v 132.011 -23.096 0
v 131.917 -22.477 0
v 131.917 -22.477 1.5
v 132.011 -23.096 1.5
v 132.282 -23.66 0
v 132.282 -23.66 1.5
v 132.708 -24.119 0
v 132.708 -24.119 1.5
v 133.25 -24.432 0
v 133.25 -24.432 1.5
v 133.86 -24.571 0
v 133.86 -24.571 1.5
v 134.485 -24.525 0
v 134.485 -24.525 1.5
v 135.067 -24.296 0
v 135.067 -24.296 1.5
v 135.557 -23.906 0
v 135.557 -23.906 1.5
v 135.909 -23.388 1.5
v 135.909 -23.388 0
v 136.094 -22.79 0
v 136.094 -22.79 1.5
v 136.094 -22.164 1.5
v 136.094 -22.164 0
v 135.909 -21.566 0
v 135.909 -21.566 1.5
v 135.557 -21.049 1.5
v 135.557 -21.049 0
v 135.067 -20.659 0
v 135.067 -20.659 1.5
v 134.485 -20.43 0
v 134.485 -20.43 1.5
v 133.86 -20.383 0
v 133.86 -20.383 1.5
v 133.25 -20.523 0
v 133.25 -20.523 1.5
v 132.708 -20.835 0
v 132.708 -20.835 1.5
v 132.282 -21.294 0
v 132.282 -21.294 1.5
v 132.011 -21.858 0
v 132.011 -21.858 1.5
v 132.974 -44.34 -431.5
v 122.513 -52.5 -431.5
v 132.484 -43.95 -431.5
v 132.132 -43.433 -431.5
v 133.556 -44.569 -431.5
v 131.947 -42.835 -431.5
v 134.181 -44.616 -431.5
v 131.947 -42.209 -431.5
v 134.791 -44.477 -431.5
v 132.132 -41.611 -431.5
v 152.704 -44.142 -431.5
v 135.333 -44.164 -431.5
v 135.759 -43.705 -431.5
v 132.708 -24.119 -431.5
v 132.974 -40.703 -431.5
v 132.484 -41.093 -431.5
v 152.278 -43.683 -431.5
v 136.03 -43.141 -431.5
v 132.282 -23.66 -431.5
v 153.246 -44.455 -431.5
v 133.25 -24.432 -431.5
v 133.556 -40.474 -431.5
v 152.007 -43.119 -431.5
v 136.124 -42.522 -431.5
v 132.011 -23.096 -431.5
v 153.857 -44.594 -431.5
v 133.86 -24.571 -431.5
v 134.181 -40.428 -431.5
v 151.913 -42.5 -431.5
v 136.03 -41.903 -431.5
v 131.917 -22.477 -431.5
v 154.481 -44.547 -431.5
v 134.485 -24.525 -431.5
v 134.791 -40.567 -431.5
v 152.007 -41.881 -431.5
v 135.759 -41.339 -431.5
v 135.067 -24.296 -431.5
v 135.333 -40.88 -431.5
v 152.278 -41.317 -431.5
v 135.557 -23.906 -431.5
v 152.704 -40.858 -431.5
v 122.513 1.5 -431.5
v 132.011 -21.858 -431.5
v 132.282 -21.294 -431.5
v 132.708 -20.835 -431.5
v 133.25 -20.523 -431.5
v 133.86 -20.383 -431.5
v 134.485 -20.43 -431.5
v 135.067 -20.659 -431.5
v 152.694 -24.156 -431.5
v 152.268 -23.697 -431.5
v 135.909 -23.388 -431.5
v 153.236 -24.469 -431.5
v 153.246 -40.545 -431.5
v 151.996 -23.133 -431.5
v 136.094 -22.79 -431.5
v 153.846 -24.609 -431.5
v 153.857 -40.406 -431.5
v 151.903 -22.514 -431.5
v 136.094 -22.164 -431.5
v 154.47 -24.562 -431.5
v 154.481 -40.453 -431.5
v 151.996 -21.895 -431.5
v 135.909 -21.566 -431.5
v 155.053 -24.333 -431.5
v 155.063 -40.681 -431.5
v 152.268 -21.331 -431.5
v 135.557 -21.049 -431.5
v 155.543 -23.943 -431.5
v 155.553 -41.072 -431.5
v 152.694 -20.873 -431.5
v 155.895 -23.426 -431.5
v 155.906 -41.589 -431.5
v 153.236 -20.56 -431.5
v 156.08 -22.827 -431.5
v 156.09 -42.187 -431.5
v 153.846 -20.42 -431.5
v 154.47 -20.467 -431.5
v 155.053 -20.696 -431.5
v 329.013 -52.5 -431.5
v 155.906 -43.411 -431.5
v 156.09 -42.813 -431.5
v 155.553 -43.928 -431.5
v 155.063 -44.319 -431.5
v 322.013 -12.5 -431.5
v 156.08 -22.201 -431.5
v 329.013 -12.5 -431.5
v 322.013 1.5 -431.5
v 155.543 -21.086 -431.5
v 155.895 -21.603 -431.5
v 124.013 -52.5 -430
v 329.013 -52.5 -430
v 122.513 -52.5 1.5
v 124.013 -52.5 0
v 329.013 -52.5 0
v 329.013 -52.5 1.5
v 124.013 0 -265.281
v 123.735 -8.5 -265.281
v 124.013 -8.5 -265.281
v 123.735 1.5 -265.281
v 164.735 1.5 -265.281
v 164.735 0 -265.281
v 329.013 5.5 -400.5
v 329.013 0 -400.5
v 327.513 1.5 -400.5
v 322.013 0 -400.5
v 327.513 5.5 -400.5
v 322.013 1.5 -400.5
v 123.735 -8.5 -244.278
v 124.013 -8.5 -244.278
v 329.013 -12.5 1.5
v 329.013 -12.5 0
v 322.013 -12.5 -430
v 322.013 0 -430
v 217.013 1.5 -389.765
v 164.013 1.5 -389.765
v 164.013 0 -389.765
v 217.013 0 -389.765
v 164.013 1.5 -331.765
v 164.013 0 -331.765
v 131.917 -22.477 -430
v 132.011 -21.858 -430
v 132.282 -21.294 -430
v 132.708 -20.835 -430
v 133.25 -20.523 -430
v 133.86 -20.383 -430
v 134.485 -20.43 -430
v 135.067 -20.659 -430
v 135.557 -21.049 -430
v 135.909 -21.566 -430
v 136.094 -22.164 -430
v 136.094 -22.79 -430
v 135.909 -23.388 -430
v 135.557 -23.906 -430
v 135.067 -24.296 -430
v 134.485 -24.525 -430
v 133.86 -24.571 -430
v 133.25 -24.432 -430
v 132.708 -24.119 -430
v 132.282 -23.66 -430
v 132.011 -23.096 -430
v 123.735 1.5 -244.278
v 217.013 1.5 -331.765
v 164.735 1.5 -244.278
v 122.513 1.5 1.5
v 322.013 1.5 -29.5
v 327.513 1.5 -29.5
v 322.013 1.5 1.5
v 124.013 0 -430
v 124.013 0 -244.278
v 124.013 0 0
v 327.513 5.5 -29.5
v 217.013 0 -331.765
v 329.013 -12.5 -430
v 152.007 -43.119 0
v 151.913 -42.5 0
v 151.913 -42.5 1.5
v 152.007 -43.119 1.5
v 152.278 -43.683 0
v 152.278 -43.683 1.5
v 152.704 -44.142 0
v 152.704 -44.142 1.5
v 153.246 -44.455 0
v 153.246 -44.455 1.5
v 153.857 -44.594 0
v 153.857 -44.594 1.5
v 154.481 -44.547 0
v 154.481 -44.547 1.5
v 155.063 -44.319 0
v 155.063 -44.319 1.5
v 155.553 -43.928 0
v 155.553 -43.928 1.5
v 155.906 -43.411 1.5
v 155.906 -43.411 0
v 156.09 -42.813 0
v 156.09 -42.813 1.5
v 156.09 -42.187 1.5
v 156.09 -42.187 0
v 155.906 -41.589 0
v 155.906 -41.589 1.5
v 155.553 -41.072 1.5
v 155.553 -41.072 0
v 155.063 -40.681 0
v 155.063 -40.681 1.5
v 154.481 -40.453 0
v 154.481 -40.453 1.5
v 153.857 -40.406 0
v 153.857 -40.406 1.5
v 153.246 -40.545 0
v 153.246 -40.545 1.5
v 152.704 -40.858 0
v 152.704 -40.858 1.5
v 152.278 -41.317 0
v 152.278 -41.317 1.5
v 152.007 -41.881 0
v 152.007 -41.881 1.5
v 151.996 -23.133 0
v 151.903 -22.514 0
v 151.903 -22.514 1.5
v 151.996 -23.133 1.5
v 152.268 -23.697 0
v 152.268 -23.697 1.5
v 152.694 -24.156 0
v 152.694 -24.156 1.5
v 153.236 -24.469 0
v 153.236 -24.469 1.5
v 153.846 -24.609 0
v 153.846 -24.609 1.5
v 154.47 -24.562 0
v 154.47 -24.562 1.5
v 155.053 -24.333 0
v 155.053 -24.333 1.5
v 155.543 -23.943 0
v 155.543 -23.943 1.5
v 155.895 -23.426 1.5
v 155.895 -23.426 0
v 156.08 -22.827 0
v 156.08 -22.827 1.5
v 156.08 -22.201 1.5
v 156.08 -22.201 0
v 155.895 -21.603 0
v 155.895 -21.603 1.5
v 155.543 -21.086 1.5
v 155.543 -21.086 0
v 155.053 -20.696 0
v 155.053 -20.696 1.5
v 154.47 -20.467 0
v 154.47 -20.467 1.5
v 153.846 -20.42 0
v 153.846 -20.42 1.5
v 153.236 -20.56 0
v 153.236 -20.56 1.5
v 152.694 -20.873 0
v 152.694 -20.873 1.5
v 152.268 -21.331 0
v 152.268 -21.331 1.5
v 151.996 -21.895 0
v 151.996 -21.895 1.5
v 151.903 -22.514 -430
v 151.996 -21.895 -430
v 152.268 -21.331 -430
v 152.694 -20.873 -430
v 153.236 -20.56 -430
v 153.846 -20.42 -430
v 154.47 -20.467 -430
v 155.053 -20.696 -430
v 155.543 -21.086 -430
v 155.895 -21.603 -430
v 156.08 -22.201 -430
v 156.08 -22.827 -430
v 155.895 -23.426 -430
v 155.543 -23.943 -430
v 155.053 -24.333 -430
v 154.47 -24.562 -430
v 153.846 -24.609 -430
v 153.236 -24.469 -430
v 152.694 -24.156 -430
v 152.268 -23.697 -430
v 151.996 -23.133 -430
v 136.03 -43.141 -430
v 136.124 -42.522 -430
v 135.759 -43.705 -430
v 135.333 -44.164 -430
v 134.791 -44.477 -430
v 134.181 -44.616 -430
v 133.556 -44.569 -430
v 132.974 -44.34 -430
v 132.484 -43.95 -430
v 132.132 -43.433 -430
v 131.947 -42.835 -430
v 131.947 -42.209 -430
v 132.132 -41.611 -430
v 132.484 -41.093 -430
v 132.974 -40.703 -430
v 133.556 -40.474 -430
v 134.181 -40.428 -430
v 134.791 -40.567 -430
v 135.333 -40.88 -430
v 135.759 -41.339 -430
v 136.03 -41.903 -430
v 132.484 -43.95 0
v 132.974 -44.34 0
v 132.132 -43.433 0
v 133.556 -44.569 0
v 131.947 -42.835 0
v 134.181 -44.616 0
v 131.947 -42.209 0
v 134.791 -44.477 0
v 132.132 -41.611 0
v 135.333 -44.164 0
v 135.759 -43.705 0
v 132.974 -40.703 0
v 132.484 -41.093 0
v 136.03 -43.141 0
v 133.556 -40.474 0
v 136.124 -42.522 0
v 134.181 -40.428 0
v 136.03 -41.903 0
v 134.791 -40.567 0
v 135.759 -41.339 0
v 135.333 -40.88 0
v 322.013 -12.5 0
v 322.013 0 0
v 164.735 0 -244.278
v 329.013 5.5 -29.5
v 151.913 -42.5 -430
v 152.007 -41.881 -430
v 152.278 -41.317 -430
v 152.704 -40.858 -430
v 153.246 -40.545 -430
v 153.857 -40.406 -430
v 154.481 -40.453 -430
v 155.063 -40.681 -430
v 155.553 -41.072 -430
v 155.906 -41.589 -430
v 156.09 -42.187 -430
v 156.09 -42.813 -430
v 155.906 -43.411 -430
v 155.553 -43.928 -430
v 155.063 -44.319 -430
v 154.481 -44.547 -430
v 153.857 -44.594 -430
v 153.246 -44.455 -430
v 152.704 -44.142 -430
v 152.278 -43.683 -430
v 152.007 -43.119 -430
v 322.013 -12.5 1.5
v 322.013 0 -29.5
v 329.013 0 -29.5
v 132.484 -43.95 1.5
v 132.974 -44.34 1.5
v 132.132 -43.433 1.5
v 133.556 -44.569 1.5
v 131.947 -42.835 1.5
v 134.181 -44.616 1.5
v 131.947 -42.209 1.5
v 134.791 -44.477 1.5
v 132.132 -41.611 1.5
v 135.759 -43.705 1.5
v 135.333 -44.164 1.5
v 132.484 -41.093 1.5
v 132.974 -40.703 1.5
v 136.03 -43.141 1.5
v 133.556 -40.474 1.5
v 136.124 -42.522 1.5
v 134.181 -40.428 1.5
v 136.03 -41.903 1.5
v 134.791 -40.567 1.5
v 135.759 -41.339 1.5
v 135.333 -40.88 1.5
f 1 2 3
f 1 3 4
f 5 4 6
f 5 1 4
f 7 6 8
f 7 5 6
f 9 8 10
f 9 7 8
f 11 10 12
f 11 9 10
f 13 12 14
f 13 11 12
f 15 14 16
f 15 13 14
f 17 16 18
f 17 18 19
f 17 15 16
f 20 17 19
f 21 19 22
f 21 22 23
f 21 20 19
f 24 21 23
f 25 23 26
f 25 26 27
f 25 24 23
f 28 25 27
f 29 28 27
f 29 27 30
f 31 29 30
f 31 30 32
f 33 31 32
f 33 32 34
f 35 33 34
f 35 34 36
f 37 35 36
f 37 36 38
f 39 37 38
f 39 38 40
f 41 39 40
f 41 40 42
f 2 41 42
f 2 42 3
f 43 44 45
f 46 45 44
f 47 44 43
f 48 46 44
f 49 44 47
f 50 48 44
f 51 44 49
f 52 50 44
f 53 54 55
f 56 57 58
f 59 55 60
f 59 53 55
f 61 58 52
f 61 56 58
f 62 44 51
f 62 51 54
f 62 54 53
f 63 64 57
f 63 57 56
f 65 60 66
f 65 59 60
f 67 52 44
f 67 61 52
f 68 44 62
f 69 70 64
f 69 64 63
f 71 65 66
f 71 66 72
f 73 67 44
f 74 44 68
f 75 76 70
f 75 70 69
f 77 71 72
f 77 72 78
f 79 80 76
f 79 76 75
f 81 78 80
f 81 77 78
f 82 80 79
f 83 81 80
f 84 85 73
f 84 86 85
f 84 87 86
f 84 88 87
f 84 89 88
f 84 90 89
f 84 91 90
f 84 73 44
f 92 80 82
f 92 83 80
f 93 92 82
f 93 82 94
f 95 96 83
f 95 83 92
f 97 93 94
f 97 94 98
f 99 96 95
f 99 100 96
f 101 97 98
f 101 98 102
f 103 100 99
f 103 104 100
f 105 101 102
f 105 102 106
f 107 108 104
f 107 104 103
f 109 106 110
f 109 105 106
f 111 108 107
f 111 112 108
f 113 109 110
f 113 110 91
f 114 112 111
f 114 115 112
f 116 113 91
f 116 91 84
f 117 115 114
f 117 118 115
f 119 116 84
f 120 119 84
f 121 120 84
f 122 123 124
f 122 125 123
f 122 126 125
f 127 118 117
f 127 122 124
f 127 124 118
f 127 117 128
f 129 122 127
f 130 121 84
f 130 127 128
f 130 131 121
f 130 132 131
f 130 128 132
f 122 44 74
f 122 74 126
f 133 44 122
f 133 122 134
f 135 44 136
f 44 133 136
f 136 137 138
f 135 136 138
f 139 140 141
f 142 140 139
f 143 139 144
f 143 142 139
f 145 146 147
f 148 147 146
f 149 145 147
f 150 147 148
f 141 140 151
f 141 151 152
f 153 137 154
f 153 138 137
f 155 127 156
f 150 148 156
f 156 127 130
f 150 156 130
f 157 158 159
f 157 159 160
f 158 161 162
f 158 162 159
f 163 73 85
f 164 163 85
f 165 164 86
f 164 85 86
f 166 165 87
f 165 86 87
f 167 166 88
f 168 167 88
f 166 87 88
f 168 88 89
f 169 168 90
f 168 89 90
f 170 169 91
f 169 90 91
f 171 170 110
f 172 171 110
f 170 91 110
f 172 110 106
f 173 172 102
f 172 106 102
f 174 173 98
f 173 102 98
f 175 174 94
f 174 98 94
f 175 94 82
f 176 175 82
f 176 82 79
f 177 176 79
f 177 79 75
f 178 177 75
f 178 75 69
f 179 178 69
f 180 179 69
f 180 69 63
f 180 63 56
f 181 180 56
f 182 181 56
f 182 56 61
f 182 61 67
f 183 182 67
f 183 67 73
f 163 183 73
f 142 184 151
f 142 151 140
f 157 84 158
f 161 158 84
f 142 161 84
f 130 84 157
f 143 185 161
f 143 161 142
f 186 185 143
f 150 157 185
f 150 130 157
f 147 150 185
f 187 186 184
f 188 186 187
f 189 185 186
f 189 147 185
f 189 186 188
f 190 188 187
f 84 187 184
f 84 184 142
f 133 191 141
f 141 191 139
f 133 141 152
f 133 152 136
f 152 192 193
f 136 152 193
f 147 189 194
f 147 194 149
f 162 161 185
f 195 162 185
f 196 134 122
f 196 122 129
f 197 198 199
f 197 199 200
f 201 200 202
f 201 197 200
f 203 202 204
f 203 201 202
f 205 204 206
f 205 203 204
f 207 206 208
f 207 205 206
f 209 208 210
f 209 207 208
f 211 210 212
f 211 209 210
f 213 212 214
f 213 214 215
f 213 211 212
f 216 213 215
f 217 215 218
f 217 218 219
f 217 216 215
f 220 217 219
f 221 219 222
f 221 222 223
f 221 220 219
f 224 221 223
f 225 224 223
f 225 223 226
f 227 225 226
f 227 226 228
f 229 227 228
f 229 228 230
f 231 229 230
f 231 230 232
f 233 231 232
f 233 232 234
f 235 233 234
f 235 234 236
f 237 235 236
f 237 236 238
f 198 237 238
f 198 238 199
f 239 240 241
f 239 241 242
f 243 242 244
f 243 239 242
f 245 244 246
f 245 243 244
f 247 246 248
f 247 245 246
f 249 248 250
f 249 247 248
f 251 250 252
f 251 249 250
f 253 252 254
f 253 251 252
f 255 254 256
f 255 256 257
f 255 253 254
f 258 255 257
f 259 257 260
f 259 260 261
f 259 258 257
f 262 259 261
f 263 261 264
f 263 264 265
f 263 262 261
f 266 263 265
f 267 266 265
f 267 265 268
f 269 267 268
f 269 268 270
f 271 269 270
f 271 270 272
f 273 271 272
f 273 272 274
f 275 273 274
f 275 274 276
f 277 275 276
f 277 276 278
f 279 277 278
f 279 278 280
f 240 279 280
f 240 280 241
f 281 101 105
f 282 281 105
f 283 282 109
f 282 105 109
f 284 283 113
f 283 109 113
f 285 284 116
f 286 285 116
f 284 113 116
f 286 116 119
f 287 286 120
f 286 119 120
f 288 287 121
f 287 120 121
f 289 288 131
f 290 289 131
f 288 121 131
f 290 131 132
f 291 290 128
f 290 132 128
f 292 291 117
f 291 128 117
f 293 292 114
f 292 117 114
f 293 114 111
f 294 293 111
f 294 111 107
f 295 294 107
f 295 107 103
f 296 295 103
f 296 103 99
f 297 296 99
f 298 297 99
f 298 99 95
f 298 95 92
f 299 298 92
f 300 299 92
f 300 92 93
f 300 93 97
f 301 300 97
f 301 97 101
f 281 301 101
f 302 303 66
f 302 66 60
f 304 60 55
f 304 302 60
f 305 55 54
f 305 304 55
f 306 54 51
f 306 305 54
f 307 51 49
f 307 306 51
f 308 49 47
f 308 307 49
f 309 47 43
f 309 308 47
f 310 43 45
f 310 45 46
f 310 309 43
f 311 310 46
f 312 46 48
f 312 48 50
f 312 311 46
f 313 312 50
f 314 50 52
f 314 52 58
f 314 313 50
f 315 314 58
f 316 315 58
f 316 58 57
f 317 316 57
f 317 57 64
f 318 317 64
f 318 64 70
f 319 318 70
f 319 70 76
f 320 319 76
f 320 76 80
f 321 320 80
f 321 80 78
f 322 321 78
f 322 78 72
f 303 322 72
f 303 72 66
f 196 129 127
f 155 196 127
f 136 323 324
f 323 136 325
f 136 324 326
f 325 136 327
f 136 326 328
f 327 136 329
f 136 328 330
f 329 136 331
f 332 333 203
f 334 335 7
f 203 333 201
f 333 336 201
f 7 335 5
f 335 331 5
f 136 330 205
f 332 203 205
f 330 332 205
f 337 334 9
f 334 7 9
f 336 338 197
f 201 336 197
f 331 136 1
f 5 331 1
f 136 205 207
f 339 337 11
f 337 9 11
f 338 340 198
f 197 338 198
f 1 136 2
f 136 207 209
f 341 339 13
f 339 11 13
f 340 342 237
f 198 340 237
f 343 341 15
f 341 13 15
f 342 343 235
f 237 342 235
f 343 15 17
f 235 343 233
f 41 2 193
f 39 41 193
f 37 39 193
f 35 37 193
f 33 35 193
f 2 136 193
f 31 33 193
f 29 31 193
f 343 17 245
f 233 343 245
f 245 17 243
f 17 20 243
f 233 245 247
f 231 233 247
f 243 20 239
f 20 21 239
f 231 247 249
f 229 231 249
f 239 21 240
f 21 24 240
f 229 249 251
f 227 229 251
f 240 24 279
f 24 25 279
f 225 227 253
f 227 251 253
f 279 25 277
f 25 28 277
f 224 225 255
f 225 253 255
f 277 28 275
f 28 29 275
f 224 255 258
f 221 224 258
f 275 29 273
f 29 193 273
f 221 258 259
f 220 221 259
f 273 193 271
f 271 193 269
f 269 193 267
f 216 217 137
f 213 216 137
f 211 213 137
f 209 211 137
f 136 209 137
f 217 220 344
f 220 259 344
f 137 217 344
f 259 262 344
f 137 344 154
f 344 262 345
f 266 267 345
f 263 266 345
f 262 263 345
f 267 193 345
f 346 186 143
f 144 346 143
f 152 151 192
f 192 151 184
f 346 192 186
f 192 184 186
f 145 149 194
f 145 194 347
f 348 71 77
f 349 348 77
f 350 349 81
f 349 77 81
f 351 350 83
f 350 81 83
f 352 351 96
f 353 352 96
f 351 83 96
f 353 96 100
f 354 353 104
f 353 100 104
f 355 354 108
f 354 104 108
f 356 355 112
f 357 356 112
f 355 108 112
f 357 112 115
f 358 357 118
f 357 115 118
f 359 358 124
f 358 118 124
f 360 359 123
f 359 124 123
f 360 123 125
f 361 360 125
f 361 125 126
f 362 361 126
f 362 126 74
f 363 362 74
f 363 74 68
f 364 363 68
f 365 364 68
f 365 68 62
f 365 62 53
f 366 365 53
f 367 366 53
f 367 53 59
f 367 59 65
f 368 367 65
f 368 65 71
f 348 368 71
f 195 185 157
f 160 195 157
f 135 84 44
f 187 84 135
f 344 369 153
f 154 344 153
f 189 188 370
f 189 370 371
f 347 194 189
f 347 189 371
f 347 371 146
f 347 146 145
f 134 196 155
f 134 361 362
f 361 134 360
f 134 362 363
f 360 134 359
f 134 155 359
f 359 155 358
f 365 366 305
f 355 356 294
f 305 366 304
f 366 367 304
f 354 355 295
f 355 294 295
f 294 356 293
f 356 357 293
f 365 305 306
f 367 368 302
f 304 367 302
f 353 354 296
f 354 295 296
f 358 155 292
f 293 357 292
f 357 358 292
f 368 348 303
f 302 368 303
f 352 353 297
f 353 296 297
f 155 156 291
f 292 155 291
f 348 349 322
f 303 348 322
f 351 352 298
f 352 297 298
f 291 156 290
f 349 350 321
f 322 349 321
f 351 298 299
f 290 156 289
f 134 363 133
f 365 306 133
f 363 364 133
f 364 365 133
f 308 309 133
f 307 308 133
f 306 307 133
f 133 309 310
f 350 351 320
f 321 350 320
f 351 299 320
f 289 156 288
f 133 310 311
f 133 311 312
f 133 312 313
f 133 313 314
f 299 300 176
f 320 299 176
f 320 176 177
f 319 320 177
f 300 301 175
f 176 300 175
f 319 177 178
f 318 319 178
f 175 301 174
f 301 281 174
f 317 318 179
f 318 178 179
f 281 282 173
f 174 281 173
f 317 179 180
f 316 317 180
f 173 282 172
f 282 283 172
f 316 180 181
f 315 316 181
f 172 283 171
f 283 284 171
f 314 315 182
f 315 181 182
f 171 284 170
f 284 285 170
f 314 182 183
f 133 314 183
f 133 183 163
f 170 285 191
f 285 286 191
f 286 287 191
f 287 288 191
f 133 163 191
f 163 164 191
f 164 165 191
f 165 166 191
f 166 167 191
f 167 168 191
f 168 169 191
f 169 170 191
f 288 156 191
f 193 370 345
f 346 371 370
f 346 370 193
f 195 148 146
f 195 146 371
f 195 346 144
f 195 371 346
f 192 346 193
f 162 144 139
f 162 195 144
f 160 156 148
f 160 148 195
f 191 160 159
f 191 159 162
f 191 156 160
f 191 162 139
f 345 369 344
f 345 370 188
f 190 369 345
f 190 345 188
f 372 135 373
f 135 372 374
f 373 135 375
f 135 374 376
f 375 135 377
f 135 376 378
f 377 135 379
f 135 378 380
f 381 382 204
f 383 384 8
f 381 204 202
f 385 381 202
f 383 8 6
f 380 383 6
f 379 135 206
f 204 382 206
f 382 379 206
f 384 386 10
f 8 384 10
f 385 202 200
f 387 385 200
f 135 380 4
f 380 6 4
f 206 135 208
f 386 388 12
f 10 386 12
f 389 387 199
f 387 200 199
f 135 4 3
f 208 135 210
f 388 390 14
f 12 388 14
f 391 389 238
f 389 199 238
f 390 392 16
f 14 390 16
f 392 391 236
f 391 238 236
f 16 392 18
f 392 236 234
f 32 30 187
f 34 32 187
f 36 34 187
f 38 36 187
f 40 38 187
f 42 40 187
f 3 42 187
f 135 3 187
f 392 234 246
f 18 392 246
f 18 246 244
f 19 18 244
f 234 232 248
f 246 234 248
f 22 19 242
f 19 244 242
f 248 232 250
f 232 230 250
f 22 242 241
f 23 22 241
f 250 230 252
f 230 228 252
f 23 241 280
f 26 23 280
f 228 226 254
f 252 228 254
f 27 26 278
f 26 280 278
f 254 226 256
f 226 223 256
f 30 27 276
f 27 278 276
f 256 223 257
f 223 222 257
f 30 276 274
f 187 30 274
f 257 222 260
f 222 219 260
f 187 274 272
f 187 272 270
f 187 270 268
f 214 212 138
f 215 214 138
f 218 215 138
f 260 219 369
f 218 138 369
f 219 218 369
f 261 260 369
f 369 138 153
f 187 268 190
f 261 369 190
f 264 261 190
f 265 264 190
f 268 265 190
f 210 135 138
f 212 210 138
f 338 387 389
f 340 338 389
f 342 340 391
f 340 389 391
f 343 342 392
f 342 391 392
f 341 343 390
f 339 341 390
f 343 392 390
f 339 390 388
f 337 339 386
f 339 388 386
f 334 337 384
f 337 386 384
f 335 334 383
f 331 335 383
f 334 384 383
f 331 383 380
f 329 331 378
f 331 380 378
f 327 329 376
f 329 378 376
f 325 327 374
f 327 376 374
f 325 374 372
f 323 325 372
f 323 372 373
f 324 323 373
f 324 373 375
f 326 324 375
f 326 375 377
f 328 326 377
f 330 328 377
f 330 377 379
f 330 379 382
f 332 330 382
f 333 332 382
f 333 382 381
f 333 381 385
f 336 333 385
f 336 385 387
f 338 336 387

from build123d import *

# Parameters (mm, degrees)
BOSS_EXTRUDE4_DEPTH  = 1.5
SKETCH5_W            = 205
SKETCH5_H            = 54
BOSS_EXTRUDE5_DEPTH  = 1.5
SKETCH8_W            = 1.5
SKETCH8_H            = 430
BOSS_EXTRUDE14_DEPTH = 4
SKETCH7_W            = 205
SKETCH7_H            = 54
BOSS_EXTRUDE18_DEPTH = 1.5
SKETCH9_W            = 433
SKETCH9_H            = 54
BOSS_EXTRUDE19_DEPTH = 1.5
SKETCH10_R           = 2.1
CUT_EXTRUDE1_DEPTH   = 10
CUT_EXTRUDE2_START   = -10
SKETCH17_R           = 2.1
CUT_EXTRUDE2_DEPTH   = 10
SKETCH16_R           = 2.1
CUT_EXTRUDE3_DEPTH   = 10
CUT_EXTRUDE4_START   = -10
SKETCH11_R           = 2.1
CUT_EXTRUDE4_DEPTH   = 10
SKETCH12_R           = 2.1
CUT_EXTRUDE5_DEPTH   = 10
SKETCH13_R           = 2.1
CUT_EXTRUDE6_DEPTH   = 10
CUT_EXTRUDE7_START   = -10
SKETCH14_R           = 2.1
CUT_EXTRUDE7_DEPTH   = 10
CUT_EXTRUDE8_START   = -10
SKETCH15_R           = 2.1
CUT_EXTRUDE8_DEPTH   = 10
SKETCH18_W           = 41
SKETCH18_H           = 21.003646253
CUT_EXTRUDE9_DEPTH   = 10
SKETCH21_W           = 53
SKETCH21_H           = 58
CUT_EXTRUDE12_DEPTH  = 10
SKETCH23_W           = 7
SKETCH23_H           = 18
CUT_EXTRUDE14_DEPTH  = 31
SKETCH24_W           = 7
SKETCH24_H           = 18
CUT_EXTRUDE15_DEPTH  = 31


with BuildPart() as part:
    # Sketch4 → Boss-Extrude4 (new body)
    with BuildSketch(Plane(origin=(0, 0, 0), x_dir=(1, 0, 0), z_dir=(0, 1, 0))):
        Polygon((124.01347733, 430), (329.01347733, 430), (329.01347733, 0), (124.01347733, 0), (124.01347733, 200), (124.01347733, 365), align=None)
    extrude(amount=BOSS_EXTRUDE4_DEPTH)

    # Sketch5 → Boss-Extrude5 (add)
    with BuildSketch(Plane.XY):
        with Locations((226.51347733, -25.5)):
            Rectangle(SKETCH5_W, SKETCH5_H)
    extrude(amount=BOSS_EXTRUDE5_DEPTH)

    # Sketch8 → Boss-Extrude14 (add)
    with BuildSketch(Plane(origin=(0, 1.5, 0), x_dir=(1, 0, 0), z_dir=(0, 1, 0))):
        with Locations((328.26347733, 215)):
            Rectangle(SKETCH8_W, SKETCH8_H)
    extrude(amount=BOSS_EXTRUDE14_DEPTH)

    # Sketch7 → Boss-Extrude18 (add)
    with BuildSketch(Plane(origin=(0, 0, -430), x_dir=(-1, 0, 0), z_dir=(0, 0, -1))):
        with Locations((-226.51347733, -25.5)):
            Rectangle(SKETCH7_W, SKETCH7_H)
    extrude(amount=BOSS_EXTRUDE18_DEPTH)

    # Sketch9 → Boss-Extrude19 (add)
    with BuildSketch(Plane.ZY.offset(-124.01347733)):
        with Locations((-215, -25.5)):
            Rectangle(SKETCH9_W, SKETCH9_H)
    extrude(amount=BOSS_EXTRUDE19_DEPTH)

    # Sketch10 → Cut-Extrude1 (cut)
    with BuildSketch(Plane(origin=(0, 0, -431.5), x_dir=(-1, 0, 0), z_dir=(0, 0, -1))):
        with Locations((-154.01347733, -42.5)):
            Circle(SKETCH10_R)
    extrude(amount=-CUT_EXTRUDE1_DEPTH, mode=Mode.SUBTRACT)

    # Sketch17 → Cut-Extrude2 (cut)
    with BuildSketch(Plane.XY.offset(1.5).offset(CUT_EXTRUDE2_START)):
        with Locations(Location((154.01347733, -42.5, 0), (0, 0, 180))):
            Circle(SKETCH17_R)
    extrude(amount=CUT_EXTRUDE2_DEPTH, mode=Mode.SUBTRACT)

    # Sketch16 → Cut-Extrude3 (cut)
    with BuildSketch(Plane.XY.offset(1.5)):
        with Locations((134.023652304, -42.521836229)):
            Circle(SKETCH16_R)
    extrude(amount=-CUT_EXTRUDE3_DEPTH, mode=Mode.SUBTRACT)

    # Sketch11 → Cut-Extrude4 (cut)
    with BuildSketch(Plane(origin=(0, 0, -431.5), x_dir=(-1, 0, 0), z_dir=(0, 0, -1)).offset(CUT_EXTRUDE4_START)):
        with Locations(Location((-134.023652304, -42.521836229, 0), (0, 0, 180))):
            Circle(SKETCH11_R)
    extrude(amount=CUT_EXTRUDE4_DEPTH, mode=Mode.SUBTRACT)

    # Sketch12 → Cut-Extrude5 (cut)
    with BuildSketch(Plane(origin=(0, 0, -431.5), x_dir=(-1, 0, 0), z_dir=(0, 0, -1))):
        with Locations((-134.017306734, -22.477341223)):
            Circle(SKETCH12_R)
    extrude(amount=-CUT_EXTRUDE5_DEPTH, mode=Mode.SUBTRACT)

    # Sketch13 → Cut-Extrude6 (cut)
    with BuildSketch(Plane(origin=(0, 0, -431.5), x_dir=(-1, 0, 0), z_dir=(0, 0, -1))):
        with Locations((-154.003183789, -22.514424589)):
            Circle(SKETCH13_R)
    extrude(amount=-CUT_EXTRUDE6_DEPTH, mode=Mode.SUBTRACT)

    # Sketch14 → Cut-Extrude7 (cut)
    with BuildSketch(Plane.XY.offset(1.5).offset(CUT_EXTRUDE7_START)):
        with Locations(Location((134.017306734, -22.477341223, 0), (0, 0, 180))):
            Circle(SKETCH14_R)
    extrude(amount=CUT_EXTRUDE7_DEPTH, mode=Mode.SUBTRACT)

    # Sketch15 → Cut-Extrude8 (cut)
    with BuildSketch(Plane.XY.offset(1.5).offset(CUT_EXTRUDE8_START)):
        with Locations(Location((154.003183789, -22.514424589, 0), (0, 0, 180))):
            Circle(SKETCH15_R)
    extrude(amount=CUT_EXTRUDE8_DEPTH, mode=Mode.SUBTRACT)

    # Sketch18 → Cut-Extrude9 (cut)
    with BuildSketch(Plane(origin=(0, 1.5, 0), x_dir=(1, 0, 0), z_dir=(0, 1, 0))):
        with Locations((144.235269619, 254.779446877)):
            Rectangle(SKETCH18_W, SKETCH18_H)
    extrude(amount=-CUT_EXTRUDE9_DEPTH, mode=Mode.SUBTRACT)

    # Sketch21 → Cut-Extrude12 (cut)
    with BuildSketch(Plane(origin=(0, 1.5, 0), x_dir=(1, 0, 0), z_dir=(0, 1, 0))):
        with Locations((190.51347733, 360.765424222)):
            Rectangle(SKETCH21_W, SKETCH21_H)
    extrude(amount=-CUT_EXTRUDE12_DEPTH, mode=Mode.SUBTRACT)

    # Sketch23 → Cut-Extrude14 (cut)
    with BuildSketch(Plane.XY.offset(1.5)):
        with Locations((325.51347733, -3.5)):
            Rectangle(SKETCH23_W, SKETCH23_H)
    extrude(amount=-CUT_EXTRUDE14_DEPTH, mode=Mode.SUBTRACT)

    # Sketch24 → Cut-Extrude15 (cut)
    with BuildSketch(Plane(origin=(0, 0, -431.5), x_dir=(-1, 0, 0), z_dir=(0, 0, -1))):
        with Locations((-325.51347733, -3.5)):
            Rectangle(SKETCH24_W, SKETCH24_H)
    extrude(amount=-CUT_EXTRUDE15_DEPTH, mode=Mode.SUBTRACT)


solid = part.part
